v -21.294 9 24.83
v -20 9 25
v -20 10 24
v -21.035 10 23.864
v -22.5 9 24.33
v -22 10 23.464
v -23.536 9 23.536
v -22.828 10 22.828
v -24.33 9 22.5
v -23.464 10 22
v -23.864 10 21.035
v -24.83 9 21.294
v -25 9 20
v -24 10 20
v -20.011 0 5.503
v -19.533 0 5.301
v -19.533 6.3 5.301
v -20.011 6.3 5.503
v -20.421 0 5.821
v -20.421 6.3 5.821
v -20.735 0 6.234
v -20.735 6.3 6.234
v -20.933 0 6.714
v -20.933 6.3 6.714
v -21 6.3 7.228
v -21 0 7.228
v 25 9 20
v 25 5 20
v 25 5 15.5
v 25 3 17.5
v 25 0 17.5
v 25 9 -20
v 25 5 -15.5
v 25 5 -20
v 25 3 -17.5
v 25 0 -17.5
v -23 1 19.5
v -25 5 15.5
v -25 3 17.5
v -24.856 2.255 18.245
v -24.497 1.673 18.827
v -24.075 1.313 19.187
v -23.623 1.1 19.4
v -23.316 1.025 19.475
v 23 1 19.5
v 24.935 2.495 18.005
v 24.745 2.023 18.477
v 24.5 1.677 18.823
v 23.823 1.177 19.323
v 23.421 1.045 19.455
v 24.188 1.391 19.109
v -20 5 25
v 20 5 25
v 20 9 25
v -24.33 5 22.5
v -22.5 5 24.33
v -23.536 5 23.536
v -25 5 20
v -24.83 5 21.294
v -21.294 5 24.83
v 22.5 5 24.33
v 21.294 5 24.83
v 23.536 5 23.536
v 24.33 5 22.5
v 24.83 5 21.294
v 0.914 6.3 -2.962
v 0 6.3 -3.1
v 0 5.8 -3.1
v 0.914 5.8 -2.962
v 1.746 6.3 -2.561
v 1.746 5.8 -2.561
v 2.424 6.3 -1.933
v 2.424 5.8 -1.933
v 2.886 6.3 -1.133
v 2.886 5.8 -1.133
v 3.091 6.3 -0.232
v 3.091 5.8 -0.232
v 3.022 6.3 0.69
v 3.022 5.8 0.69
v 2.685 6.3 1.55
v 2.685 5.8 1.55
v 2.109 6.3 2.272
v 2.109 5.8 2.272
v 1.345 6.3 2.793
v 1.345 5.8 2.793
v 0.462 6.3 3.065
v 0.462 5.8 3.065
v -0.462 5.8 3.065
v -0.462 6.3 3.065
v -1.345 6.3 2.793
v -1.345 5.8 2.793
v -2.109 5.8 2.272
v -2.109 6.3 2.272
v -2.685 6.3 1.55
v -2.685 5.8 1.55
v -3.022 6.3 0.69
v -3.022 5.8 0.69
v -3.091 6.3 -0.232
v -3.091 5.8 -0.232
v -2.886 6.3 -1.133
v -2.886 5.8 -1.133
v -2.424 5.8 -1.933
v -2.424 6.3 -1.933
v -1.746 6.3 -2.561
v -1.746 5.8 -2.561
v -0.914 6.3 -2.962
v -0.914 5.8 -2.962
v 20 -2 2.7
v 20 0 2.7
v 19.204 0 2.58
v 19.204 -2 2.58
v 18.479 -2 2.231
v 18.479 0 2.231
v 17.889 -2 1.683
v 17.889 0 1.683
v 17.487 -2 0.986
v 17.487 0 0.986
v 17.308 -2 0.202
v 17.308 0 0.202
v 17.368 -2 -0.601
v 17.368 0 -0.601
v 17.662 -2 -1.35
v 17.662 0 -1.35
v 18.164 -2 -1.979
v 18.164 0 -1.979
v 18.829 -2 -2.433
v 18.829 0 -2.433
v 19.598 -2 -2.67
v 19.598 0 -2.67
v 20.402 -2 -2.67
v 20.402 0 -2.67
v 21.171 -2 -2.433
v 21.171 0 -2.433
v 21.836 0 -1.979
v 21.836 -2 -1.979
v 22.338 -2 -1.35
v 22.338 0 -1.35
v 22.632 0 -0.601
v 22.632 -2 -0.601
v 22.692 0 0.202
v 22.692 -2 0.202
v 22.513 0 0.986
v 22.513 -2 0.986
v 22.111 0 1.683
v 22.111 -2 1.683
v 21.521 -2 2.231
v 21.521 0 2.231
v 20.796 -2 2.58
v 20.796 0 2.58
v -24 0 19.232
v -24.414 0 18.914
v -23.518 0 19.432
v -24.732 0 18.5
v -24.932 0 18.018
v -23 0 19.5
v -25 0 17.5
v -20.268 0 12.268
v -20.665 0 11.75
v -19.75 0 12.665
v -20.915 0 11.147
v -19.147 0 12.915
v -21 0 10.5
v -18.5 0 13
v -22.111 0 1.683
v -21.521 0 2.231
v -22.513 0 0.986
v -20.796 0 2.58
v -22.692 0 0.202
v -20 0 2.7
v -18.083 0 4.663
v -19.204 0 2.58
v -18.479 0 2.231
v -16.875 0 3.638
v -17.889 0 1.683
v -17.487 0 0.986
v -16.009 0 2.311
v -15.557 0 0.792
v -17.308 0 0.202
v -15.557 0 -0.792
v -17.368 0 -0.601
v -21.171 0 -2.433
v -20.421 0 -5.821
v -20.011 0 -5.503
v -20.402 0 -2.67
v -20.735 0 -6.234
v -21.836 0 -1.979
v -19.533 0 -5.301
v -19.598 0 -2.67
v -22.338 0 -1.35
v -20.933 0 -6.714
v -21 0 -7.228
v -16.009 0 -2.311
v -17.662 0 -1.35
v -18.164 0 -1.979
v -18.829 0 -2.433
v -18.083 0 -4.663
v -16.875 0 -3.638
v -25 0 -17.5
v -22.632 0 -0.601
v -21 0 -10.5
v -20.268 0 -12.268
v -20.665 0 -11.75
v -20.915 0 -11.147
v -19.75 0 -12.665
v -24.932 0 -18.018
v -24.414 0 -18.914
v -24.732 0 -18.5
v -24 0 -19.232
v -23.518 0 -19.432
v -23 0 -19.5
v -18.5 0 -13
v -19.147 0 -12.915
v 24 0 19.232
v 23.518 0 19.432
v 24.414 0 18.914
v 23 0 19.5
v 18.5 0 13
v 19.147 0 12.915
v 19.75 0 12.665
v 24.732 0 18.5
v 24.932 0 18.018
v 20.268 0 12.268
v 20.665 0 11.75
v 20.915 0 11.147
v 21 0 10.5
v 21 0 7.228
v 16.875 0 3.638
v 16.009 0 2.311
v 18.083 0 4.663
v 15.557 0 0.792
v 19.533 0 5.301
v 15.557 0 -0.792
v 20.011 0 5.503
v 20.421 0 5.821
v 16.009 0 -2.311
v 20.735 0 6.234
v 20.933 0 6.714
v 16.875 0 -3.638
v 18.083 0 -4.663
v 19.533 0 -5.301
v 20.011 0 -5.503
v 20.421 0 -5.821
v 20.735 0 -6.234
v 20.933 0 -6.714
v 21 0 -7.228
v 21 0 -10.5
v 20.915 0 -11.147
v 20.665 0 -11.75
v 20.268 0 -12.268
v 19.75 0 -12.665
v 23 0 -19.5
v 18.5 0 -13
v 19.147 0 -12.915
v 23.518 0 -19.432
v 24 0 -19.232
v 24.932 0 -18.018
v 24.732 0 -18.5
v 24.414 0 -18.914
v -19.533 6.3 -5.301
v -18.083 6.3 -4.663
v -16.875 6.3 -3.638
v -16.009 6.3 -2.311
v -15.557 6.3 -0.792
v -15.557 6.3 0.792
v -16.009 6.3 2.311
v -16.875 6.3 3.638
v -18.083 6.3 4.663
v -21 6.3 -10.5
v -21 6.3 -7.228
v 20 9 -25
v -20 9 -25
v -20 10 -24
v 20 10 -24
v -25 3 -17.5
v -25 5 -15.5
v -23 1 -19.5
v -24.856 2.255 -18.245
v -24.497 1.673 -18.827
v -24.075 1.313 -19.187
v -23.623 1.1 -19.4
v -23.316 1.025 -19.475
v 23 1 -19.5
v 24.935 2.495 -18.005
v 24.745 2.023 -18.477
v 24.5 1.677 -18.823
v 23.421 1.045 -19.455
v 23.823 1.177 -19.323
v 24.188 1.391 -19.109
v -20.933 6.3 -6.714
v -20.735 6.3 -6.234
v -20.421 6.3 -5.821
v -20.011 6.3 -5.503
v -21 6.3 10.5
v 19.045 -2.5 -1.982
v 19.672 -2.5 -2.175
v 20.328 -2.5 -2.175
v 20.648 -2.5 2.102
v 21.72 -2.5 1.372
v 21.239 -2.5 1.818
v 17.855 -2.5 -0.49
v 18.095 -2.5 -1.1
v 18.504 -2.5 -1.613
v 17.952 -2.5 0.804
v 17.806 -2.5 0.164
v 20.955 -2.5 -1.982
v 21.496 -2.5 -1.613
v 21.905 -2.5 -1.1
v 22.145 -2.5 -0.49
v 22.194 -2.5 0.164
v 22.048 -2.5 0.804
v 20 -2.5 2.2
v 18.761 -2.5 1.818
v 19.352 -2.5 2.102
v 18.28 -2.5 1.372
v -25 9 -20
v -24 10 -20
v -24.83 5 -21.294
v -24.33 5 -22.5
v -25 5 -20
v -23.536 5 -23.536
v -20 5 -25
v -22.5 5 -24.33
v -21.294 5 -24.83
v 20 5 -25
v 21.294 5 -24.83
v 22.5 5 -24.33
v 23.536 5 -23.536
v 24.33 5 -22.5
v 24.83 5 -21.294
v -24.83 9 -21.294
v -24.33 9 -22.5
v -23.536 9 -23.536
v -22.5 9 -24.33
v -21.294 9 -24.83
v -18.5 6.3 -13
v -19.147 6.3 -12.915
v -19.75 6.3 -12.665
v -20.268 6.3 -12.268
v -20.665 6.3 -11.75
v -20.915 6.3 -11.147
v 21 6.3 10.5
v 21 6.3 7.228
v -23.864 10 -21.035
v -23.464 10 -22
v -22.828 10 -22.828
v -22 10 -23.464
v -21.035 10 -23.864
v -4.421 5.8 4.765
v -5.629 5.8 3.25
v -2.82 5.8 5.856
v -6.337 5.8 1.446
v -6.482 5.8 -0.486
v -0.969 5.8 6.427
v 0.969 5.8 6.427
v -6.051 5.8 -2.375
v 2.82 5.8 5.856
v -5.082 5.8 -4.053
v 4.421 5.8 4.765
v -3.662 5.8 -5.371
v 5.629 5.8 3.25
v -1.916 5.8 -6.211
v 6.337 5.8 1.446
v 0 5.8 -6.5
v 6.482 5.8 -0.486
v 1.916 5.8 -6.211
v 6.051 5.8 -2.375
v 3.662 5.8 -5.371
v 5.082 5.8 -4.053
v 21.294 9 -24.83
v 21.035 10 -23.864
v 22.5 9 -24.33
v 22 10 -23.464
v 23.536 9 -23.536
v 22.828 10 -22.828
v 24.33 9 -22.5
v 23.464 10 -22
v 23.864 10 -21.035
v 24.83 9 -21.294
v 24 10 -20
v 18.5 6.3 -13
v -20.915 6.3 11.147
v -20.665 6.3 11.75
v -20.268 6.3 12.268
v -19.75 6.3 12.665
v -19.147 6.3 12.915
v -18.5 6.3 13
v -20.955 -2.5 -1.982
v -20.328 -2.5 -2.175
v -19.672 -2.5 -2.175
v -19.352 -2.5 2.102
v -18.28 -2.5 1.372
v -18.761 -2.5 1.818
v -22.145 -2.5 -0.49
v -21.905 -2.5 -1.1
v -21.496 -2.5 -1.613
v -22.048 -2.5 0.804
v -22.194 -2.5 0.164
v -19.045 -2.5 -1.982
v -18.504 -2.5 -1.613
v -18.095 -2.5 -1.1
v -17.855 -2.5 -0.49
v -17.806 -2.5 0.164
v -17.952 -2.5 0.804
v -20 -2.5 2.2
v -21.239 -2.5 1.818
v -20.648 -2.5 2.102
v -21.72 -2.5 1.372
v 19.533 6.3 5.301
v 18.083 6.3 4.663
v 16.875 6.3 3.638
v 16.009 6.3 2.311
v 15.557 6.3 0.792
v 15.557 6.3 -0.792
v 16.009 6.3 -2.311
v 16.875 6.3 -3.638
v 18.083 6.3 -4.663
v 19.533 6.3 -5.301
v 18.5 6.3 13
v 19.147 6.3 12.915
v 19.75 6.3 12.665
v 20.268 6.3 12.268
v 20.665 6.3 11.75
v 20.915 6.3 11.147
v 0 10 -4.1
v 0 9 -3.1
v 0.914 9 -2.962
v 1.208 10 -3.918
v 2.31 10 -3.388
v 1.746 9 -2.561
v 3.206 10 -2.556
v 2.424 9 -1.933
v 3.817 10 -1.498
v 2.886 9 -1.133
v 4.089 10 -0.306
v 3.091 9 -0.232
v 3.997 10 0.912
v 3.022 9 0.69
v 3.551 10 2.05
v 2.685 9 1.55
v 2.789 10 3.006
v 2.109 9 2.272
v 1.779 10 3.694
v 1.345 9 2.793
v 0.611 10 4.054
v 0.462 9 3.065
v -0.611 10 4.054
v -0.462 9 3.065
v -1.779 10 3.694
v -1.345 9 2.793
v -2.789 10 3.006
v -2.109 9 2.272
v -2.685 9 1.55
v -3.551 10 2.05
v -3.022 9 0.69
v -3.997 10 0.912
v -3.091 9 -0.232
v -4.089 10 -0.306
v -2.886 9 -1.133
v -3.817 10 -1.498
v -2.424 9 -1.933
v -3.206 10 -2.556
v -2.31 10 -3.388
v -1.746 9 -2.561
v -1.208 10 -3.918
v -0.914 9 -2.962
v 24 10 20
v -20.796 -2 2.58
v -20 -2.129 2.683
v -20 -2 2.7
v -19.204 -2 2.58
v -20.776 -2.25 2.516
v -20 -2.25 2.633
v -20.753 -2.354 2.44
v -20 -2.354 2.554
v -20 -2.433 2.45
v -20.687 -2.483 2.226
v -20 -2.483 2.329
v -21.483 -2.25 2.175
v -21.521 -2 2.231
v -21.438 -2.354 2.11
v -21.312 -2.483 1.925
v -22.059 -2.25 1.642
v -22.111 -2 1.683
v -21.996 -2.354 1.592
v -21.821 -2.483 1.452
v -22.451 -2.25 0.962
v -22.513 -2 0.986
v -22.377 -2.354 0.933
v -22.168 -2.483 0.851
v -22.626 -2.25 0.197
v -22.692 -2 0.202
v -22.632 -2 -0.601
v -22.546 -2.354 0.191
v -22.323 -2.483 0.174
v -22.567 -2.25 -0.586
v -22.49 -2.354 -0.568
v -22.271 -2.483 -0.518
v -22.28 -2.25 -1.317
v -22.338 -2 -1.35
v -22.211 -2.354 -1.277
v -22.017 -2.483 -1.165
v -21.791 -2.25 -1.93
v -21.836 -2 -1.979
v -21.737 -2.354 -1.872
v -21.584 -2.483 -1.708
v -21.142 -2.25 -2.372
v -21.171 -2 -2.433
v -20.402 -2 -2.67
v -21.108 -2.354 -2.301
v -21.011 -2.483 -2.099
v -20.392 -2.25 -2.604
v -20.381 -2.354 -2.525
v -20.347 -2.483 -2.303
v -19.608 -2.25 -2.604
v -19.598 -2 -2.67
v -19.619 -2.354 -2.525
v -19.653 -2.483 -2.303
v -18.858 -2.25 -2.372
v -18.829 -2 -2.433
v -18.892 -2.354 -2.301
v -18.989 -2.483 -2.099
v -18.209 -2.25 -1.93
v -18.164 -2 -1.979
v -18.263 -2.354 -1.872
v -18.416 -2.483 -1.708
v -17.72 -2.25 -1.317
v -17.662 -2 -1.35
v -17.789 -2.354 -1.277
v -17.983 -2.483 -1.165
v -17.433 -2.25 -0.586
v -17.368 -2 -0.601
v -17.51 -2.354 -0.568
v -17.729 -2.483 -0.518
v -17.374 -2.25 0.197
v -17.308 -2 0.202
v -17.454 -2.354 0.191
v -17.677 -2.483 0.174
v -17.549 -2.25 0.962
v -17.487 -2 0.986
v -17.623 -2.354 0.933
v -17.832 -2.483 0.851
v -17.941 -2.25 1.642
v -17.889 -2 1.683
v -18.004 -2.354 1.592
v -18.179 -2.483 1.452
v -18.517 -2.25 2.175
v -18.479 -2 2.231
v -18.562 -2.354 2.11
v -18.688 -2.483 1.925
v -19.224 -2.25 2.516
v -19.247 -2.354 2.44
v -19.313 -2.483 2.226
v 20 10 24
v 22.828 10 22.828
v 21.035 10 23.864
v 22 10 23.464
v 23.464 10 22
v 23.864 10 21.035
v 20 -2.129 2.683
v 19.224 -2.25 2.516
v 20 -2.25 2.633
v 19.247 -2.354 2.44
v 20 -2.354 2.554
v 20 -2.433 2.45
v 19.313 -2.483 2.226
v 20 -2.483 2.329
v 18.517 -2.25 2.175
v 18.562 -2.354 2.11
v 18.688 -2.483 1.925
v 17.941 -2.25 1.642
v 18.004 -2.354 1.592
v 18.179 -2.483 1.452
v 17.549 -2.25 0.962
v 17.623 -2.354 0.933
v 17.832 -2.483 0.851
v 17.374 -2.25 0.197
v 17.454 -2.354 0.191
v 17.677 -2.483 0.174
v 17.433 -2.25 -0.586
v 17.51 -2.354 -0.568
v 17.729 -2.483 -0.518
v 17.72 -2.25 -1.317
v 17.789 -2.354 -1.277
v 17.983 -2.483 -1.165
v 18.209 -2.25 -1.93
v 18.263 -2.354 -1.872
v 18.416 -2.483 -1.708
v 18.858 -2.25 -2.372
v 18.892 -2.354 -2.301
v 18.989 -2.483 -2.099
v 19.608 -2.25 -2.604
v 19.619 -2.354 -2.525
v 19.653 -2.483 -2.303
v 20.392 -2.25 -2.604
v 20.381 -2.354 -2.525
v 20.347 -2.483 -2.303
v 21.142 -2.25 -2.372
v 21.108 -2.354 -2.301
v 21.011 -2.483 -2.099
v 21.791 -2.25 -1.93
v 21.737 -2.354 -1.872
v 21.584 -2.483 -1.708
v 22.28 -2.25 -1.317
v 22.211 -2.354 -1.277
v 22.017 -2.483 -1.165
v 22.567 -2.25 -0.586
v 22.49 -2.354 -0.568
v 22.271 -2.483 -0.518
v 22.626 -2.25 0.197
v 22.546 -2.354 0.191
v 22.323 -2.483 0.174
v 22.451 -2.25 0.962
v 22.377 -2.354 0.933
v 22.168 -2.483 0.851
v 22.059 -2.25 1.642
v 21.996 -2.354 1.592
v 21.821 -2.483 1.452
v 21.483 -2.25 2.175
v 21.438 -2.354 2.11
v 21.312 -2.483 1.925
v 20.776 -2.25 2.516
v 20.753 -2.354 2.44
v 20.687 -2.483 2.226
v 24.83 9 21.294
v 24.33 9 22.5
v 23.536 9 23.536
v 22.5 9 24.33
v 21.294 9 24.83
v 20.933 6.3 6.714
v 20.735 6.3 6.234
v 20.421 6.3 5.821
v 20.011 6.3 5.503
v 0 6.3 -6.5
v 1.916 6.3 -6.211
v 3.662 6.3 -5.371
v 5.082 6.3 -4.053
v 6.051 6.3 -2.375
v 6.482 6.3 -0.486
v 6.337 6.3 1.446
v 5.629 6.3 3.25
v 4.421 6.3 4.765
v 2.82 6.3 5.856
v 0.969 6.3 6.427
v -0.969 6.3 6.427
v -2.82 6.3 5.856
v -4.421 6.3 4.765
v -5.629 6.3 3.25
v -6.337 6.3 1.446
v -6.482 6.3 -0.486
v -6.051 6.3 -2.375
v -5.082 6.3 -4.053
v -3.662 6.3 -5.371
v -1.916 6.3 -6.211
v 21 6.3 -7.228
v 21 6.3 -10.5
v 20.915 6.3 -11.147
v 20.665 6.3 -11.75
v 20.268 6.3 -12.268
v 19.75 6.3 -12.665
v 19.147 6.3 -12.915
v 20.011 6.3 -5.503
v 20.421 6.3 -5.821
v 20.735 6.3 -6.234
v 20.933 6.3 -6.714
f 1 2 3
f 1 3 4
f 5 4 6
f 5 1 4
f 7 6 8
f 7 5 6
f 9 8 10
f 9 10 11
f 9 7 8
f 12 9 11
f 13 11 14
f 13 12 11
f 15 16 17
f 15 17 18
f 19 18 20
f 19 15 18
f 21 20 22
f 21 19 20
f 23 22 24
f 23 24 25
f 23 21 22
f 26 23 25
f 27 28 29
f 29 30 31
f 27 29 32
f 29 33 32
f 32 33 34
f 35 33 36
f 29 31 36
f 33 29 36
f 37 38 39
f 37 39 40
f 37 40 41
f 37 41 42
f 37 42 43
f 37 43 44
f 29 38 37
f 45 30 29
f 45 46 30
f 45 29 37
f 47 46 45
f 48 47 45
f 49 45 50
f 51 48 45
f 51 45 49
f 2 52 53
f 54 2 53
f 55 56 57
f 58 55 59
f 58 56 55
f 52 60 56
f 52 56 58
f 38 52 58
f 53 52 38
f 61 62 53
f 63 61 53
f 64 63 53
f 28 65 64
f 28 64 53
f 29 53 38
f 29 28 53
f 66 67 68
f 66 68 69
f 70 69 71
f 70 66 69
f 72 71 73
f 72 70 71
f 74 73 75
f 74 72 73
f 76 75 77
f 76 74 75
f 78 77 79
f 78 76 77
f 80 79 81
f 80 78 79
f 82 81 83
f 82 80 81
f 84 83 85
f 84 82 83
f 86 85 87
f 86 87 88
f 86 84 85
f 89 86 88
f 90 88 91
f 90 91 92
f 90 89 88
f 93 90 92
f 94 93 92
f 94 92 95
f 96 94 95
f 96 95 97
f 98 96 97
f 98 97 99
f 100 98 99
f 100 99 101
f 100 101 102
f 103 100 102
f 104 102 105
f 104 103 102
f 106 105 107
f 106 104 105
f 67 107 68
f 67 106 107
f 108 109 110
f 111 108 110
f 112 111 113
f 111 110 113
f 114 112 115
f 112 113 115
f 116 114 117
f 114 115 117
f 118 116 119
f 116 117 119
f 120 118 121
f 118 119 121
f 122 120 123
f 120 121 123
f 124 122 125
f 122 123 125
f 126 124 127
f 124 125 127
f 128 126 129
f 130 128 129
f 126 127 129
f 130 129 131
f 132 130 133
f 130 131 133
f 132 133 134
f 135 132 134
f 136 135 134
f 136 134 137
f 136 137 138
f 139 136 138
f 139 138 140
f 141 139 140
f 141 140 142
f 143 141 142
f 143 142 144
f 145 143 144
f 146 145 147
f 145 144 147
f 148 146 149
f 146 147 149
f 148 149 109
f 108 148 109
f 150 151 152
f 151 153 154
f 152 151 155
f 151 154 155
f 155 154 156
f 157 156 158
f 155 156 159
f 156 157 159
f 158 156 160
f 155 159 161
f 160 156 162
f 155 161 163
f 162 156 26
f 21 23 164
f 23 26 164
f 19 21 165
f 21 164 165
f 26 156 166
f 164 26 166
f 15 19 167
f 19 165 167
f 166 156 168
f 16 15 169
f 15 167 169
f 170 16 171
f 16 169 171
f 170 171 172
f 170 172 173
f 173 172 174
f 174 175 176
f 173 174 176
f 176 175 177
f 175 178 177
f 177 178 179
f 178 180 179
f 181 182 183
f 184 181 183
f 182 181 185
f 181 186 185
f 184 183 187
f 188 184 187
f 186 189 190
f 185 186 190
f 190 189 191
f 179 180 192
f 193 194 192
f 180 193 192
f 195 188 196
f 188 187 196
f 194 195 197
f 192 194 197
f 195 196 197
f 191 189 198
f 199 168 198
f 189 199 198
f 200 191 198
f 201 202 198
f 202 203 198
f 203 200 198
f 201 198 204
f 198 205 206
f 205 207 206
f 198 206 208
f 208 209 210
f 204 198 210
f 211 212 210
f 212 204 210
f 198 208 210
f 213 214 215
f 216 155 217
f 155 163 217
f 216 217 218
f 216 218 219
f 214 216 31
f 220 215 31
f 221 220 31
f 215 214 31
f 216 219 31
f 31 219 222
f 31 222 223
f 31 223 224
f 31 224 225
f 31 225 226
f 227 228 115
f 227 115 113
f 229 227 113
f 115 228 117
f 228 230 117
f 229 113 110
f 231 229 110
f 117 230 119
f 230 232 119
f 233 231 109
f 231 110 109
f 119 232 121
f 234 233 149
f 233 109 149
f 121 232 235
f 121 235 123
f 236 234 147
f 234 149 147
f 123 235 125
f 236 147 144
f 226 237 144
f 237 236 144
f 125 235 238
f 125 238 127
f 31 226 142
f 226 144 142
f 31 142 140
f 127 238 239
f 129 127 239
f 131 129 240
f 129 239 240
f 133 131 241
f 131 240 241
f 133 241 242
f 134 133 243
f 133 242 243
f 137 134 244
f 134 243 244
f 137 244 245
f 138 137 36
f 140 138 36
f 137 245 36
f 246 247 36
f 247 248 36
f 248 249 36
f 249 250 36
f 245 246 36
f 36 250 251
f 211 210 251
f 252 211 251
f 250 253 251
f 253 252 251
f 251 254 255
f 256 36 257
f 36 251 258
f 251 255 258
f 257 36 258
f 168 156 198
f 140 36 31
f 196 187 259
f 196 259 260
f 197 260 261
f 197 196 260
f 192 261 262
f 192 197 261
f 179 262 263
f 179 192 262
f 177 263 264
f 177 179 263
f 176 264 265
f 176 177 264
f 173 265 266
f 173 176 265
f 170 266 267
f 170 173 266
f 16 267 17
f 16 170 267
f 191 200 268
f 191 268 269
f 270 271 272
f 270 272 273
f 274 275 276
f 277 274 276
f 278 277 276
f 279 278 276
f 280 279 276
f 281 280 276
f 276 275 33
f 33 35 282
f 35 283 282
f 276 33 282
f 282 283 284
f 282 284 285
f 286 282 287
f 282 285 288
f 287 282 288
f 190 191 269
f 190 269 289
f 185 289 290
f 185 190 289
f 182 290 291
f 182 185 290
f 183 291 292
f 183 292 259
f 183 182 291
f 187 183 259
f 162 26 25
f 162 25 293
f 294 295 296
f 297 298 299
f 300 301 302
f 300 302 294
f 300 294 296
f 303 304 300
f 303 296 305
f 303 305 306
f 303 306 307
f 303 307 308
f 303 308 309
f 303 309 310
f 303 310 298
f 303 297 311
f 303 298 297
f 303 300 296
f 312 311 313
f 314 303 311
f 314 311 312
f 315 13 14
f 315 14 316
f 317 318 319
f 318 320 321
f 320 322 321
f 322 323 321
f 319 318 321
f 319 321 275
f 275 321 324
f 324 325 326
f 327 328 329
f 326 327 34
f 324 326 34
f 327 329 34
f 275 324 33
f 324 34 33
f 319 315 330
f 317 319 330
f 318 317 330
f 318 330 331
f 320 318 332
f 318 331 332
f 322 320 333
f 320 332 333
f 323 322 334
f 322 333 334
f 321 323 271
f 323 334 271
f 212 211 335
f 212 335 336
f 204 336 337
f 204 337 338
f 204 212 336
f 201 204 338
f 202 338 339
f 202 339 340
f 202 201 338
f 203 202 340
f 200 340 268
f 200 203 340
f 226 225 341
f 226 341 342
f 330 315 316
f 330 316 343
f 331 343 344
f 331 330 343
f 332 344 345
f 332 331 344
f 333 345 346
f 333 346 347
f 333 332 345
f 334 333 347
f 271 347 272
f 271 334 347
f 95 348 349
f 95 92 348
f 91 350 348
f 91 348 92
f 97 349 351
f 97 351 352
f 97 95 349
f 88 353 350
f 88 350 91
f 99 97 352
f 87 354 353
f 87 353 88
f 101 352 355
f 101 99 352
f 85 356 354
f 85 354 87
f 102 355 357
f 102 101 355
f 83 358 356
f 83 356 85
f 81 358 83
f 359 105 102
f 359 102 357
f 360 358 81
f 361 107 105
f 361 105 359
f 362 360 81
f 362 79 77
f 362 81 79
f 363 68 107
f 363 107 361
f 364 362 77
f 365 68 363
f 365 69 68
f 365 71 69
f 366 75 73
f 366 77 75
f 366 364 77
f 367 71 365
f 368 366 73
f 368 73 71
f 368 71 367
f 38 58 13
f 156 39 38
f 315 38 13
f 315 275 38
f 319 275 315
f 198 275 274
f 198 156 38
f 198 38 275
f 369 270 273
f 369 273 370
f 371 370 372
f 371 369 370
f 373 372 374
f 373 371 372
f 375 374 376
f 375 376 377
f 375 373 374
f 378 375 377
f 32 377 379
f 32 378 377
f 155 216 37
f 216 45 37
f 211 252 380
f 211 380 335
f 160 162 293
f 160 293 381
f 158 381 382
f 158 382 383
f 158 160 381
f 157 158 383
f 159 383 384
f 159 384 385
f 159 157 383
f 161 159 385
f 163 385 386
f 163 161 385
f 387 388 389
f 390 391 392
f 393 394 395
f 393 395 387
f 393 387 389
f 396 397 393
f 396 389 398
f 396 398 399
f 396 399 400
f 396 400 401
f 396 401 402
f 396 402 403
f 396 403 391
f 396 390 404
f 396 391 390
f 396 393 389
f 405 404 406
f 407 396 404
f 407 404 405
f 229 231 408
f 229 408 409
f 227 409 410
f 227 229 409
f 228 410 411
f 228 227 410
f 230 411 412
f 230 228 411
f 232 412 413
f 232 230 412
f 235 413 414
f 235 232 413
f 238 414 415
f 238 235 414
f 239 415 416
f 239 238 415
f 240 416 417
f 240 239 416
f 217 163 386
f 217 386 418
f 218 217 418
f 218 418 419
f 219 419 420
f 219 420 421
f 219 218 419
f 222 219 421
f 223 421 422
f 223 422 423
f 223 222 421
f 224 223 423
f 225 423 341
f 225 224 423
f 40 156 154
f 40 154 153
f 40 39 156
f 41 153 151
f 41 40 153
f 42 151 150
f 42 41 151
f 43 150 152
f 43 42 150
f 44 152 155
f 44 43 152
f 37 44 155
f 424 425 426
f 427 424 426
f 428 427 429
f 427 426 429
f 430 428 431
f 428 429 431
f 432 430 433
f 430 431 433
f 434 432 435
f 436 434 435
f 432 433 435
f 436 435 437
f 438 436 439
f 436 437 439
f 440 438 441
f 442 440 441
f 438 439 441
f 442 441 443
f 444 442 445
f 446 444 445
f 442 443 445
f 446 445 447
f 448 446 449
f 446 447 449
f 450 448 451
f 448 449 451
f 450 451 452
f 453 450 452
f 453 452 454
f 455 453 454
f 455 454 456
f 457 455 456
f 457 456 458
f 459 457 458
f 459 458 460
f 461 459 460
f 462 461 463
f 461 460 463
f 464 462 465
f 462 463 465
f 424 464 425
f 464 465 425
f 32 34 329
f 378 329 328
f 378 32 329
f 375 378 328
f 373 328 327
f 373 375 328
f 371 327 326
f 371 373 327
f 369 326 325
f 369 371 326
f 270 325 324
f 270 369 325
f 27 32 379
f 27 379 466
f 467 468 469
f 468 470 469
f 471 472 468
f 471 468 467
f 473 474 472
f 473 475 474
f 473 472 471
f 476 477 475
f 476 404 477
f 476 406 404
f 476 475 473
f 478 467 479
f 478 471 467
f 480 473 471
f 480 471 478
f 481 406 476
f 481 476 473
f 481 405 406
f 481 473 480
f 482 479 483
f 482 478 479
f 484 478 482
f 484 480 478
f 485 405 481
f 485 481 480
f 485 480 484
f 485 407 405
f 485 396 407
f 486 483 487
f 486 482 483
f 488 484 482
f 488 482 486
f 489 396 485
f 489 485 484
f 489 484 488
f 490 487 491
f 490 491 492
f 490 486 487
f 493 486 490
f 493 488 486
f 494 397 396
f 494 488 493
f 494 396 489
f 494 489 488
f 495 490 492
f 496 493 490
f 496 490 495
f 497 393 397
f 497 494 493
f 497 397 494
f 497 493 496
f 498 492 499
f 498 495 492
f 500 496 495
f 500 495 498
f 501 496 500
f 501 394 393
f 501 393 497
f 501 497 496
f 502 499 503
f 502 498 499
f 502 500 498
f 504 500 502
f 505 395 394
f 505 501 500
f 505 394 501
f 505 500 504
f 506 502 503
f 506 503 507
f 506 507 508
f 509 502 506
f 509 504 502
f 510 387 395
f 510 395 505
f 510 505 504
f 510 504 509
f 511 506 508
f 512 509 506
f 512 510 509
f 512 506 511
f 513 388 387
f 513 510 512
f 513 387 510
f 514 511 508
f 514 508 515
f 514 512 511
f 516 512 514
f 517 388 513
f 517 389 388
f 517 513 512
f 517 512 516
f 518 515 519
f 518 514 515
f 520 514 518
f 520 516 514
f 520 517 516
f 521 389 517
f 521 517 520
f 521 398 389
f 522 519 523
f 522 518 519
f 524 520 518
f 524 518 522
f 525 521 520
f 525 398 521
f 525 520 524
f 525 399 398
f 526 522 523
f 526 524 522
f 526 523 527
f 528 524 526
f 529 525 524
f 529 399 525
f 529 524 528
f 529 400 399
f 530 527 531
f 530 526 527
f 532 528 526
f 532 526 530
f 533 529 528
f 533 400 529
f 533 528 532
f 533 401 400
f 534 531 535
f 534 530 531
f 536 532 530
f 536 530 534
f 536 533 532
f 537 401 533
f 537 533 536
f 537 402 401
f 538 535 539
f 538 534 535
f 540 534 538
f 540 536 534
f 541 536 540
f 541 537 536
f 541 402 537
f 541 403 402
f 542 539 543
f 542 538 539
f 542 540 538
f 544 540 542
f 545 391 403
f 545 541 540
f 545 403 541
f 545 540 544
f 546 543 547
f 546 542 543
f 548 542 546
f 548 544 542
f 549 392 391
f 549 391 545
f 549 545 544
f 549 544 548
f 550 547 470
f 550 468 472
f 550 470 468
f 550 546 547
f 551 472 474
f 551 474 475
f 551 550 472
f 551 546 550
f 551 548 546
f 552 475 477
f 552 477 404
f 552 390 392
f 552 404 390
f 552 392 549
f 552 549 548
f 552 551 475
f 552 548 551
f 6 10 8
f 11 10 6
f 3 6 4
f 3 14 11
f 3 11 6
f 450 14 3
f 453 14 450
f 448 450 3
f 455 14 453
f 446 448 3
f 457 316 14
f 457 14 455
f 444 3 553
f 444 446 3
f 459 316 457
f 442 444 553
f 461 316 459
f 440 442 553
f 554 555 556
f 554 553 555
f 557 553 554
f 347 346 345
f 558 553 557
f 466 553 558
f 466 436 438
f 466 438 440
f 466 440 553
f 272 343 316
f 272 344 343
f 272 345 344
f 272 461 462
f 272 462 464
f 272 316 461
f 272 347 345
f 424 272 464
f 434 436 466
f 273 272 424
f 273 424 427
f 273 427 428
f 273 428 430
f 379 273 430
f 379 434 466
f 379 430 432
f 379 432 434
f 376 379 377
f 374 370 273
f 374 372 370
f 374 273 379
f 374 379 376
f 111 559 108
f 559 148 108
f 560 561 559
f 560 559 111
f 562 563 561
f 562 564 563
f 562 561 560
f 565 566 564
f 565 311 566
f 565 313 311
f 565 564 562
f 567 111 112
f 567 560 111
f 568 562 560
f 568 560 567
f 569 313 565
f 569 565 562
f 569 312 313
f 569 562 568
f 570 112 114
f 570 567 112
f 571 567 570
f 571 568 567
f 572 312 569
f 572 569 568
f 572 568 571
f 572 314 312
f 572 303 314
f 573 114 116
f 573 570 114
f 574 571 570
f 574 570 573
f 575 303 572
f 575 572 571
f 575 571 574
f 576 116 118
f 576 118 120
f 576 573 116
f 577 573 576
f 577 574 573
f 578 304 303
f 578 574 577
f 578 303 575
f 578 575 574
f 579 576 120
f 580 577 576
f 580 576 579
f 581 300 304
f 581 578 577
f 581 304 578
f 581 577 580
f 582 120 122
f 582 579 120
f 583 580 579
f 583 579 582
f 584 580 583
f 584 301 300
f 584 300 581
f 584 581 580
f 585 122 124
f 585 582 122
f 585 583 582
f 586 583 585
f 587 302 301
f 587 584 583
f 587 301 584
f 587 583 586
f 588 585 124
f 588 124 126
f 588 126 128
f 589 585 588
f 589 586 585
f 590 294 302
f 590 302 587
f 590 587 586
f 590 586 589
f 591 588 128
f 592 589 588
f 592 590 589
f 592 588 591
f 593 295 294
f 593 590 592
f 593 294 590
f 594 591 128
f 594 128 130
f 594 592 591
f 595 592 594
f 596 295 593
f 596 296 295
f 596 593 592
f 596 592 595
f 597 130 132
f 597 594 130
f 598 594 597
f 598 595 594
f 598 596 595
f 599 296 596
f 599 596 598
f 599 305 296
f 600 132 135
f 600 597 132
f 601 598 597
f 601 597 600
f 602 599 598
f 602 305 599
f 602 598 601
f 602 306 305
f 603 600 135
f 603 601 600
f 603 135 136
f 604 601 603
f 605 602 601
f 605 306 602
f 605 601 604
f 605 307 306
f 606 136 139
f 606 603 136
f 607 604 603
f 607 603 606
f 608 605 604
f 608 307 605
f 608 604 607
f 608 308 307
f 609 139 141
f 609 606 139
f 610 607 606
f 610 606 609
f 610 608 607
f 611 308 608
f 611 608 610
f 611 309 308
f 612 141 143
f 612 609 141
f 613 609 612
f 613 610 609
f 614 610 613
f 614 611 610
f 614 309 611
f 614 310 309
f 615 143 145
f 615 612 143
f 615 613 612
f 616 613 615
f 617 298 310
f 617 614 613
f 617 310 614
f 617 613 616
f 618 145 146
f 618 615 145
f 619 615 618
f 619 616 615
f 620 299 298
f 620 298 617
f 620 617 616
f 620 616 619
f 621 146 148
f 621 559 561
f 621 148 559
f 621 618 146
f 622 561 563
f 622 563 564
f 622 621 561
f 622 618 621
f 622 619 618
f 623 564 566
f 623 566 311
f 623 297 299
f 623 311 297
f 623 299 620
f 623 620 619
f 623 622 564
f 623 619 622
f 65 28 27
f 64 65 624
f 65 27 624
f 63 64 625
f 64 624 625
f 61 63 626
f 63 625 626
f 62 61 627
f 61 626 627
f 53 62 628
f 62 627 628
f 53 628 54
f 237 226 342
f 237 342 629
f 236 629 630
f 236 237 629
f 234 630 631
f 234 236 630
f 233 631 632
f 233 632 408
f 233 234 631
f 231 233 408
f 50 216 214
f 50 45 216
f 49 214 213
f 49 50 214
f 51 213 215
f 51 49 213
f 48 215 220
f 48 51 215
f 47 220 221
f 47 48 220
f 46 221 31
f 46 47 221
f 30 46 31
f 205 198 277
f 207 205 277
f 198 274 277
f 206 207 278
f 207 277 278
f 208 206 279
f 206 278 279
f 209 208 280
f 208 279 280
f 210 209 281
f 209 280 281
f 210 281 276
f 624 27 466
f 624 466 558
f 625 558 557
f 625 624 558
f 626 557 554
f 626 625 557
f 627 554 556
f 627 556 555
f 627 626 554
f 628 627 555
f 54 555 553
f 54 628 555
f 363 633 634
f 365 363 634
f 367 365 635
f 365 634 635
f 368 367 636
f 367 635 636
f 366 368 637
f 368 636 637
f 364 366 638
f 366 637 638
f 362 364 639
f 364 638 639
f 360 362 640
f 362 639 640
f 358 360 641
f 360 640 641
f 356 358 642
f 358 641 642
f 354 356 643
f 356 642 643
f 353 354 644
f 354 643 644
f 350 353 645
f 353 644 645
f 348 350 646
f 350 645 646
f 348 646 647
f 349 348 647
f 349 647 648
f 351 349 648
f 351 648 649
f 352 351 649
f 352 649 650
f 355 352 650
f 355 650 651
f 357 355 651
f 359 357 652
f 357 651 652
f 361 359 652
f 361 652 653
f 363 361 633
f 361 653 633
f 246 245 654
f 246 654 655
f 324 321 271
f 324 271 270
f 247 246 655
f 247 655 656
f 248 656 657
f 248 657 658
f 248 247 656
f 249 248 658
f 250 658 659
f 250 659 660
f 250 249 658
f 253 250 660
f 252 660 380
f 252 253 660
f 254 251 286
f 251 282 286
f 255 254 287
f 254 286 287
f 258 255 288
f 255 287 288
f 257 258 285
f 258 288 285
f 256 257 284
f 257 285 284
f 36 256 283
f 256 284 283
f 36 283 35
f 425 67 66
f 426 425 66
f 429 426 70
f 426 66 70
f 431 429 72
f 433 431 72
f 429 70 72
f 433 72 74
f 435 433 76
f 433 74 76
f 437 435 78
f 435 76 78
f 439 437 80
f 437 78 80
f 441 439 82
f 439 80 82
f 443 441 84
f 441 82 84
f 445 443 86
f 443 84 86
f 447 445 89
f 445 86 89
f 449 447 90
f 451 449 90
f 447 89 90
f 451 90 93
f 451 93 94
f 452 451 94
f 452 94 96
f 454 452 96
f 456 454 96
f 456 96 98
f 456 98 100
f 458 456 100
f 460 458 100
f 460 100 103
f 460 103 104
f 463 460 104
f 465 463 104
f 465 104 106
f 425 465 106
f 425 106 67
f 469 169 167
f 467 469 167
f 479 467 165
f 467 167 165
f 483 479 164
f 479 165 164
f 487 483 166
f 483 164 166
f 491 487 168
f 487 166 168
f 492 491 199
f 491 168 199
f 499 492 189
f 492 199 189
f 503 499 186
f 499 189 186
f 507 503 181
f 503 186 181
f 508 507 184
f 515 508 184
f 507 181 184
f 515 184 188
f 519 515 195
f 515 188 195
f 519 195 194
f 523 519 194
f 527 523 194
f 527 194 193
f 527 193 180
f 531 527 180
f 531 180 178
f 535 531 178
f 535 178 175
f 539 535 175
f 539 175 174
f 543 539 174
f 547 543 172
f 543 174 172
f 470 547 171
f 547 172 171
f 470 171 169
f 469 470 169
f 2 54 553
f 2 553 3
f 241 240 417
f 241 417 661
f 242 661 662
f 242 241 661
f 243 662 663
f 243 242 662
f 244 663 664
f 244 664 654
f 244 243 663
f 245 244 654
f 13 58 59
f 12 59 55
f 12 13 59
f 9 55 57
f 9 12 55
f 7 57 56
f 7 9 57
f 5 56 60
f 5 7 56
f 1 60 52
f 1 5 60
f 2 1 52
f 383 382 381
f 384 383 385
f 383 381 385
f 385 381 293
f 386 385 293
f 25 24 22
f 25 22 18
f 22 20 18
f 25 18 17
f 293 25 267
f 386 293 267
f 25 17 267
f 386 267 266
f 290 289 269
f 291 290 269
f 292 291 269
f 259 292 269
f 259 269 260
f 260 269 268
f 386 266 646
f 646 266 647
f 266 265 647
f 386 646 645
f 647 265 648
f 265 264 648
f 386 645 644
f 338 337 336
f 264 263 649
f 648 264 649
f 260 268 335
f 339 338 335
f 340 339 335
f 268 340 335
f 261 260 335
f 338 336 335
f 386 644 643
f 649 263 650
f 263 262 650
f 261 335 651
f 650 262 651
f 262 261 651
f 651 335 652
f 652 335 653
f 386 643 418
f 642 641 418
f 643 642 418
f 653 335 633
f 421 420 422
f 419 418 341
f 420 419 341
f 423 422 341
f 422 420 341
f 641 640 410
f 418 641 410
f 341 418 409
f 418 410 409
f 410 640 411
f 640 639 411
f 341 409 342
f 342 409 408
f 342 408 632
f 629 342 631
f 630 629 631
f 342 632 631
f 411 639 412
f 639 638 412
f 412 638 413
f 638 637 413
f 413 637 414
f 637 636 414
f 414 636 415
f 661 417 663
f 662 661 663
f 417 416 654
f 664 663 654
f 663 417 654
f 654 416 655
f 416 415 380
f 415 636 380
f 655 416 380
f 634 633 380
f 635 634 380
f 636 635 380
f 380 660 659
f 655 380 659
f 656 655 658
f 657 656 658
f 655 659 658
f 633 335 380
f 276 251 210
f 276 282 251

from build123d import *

# Parameters (mm, degrees)
SKETCH1_W           = 50
SKETCH1_H           = 50
BOSS_EXTRUDE1_DEPTH = 10
CUT_EXTRUDE3_DEPTH  = 6.3
SKETCH5_R           = 6.5
SKETCH5_R_2         = 3.1
BOSS_EXTRUDE2_DEPTH = 0.5
SKETCH6_R           = 2.7
BOSS_EXTRUDE3_DEPTH = 2.5
FILLET1_R           = 0.5
CUT_EXTRUDE4_DEPTH  = 57.789083458
FILLET2_R           = 5
CHAMFER1_SIZE       = 1
CHAMFER2_SIZE       = 1
CHAMFER2_SIZE2      = 1.414213562
FILLET3_R           = 2
SKETCH9_R           = 3.1
CUT_EXTRUDE5_DEPTH  = 37.434050008
CHAMFER3_SIZE       = 1


with BuildPart() as part:
    # Sketch1 → Boss-Extrude1 (new body)
    with BuildSketch(Plane(origin=(0, 0, 0), x_dir=(1, 0, 0), z_dir=(0, 1, 0))):
        Rectangle(SKETCH1_W, SKETCH1_H)
    extrude(amount=BOSS_EXTRUDE1_DEPTH)

    # Sketch4 → Cut-Extrude3 (cut)
    with BuildSketch(Plane(origin=(0, 0, 0), x_dir=(-1, 0, 0), z_dir=(0, -1, 0))):
        with BuildLine():
            Line((21, -7.228416147), (21, -10.5))
            ThreePointArc((21, -10.5), (20.267766953, -12.267766953), (18.5, -13))
            Line((18.5, -13), (-18.5, -13))
            ThreePointArc((-18.5, -13), (-20.267766953, -12.267766953), (-21, -10.5))
            Line((-21, -10.5), (-21, -7.228416147))
            ThreePointArc((-21, -7.228416147), (-20.591644852, -6.017356006), (-19.533333333, -5.300838508))
            ThreePointArc((-19.533333333, -5.300838508), (-15.5, 0), (-19.533333333, 5.300838508))
            ThreePointArc((-19.533333333, 5.300838508), (-20.591644852, 6.017356006), (-21, 7.228416147))
            Line((-21, 7.228416147), (-21, 10.5))
            ThreePointArc((-21, 10.5), (-20.267766953, 12.267766953), (-18.5, 13))
            Line((-18.5, 13), (18.5, 13))
            ThreePointArc((18.5, 13), (20.267766953, 12.267766953), (21, 10.5))
            Line((21, 10.5), (21, 7.228416147))
            ThreePointArc((21, 7.228416147), (20.591644852, 6.017356006), (19.533333333, 5.300838508))
            ThreePointArc((19.533333333, 5.300838508), (15.5, 0), (19.533333333, -5.300838508))
            ThreePointArc((19.533333333, -5.300838508), (20.591644852, -6.017356006), (21, -7.228416147))
        make_face()
    extrude(amount=-CUT_EXTRUDE3_DEPTH, mode=Mode.SUBTRACT)

    # Sketch5 → Boss-Extrude2 (add)
    with BuildSketch(Plane(origin=(0, 6.3, 0), x_dir=(-1, 0, 0), z_dir=(0, -1, 0))):
        with Locations(Location((0, 0, 0), (0, 0, 90))):
            Circle(SKETCH5_R)
        with Locations(Location((0, 0, 0), (0, 0, 90))):
            Circle(SKETCH5_R_2, mode=Mode.SUBTRACT)
    extrude(amount=BOSS_EXTRUDE2_DEPTH)

    # Sketch6 → Boss-Extrude3 (add)
    with BuildSketch(Plane.XZ):
        with Locations(Location((-20, 0, 0), (0, 0, 90))):
            Circle(SKETCH6_R)
        with Locations(Location((20, 0, 0), (0, 0, 90))):
            Circle(SKETCH6_R)
    extrude(amount=BOSS_EXTRUDE3_DEPTH)

    # Fillet1
    fillet1_edges = [part.edges().sort_by_distance(p)[0] for p in [
        (-20, -2.5, -2.7),
        (20, -2.5, -2.7),
    ]]
    fillet(fillet1_edges, radius=FILLET1_R)

    # Sketch8 → Cut-Extrude4 (cut, through all)
    with BuildSketch(Plane(origin=(25, 0, 0), x_dir=(0, 0, -1), z_dir=(1, 0, 0))):
        Polygon((-25, 0), (-25, 5), (-15.5, 5), (-20.5, 0), align=None)
        Polygon((25, 0), (25, 5), (15.5, 5), (20.5, 0), align=None)
    extrude(amount=-CUT_EXTRUDE4_DEPTH, mode=Mode.SUBTRACT)

    # Fillet2
    fillet2_edges = [part.edges().sort_by_distance(p)[0] for p in [
        (-25, 7.5, -25),
        (25, 7.5, -25),
        (25, 7.5, 25),
        (-25, 7.5, 25),
    ]]
    fillet(fillet2_edges, radius=FILLET2_R)

    # Chamfer1
    chamfer1_edges = [part.edges().sort_by_distance(p)[0] for p in [
        (0, 10, -25),
        (25, 10, 0),
        (-25, 10, 0),
        (0, 10, 25),
        (23.535533906, 10, 23.535533906),
        (-23.535533906, 10, 23.535533906),
        (-23.535533906, 10, -23.535533906),
        (23.535533906, 10, -23.535533906),
    ]]
    chamfer(chamfer1_edges, length=CHAMFER1_SIZE)

    # Chamfer2
    chamfer2_edges = [part.edges().sort_by_distance(p)[0] for p in [
        (0, 0, 20.5),
        (0, 0, -20.5),
    ]]
    chamfer2_side = [part.faces().sort_by_distance(p)[0] for p in [
        (24.353393474, 0, 0),
    ]]
    chamfer(chamfer2_edges, length=CHAMFER2_SIZE, length2=CHAMFER2_SIZE2, reference=chamfer2_side[0])

    # Fillet3
    fillet3_edges = [part.edges().sort_by_distance(p)[0] for p in [
        (25, 0.5, -19.5),
        (25, 0.5, 19.5),
        (-25, 0.5, -19.5),
        (-25, 0.5, 19.5),
    ]]
    fillet(fillet3_edges, radius=FILLET3_R)

    # Sketch9 → Cut-Extrude5 (cut, through all)
    with BuildSketch(Plane(origin=(0, 6.3, 0), x_dir=(-1, 0, 0), z_dir=(0, -1, 0))):
        with Locations(Location((0, 0, 0), (0, 0, 90))):
            Circle(SKETCH9_R)
    extrude(amount=-CUT_EXTRUDE5_DEPTH, mode=Mode.SUBTRACT)

    # Chamfer3
    chamfer3_edges = [part.edges().sort_by_distance(p)[0] for p in [
        (0, 10, 3.1),
    ]]
    chamfer(chamfer3_edges, length=CHAMFER3_SIZE)


solid = part.part
